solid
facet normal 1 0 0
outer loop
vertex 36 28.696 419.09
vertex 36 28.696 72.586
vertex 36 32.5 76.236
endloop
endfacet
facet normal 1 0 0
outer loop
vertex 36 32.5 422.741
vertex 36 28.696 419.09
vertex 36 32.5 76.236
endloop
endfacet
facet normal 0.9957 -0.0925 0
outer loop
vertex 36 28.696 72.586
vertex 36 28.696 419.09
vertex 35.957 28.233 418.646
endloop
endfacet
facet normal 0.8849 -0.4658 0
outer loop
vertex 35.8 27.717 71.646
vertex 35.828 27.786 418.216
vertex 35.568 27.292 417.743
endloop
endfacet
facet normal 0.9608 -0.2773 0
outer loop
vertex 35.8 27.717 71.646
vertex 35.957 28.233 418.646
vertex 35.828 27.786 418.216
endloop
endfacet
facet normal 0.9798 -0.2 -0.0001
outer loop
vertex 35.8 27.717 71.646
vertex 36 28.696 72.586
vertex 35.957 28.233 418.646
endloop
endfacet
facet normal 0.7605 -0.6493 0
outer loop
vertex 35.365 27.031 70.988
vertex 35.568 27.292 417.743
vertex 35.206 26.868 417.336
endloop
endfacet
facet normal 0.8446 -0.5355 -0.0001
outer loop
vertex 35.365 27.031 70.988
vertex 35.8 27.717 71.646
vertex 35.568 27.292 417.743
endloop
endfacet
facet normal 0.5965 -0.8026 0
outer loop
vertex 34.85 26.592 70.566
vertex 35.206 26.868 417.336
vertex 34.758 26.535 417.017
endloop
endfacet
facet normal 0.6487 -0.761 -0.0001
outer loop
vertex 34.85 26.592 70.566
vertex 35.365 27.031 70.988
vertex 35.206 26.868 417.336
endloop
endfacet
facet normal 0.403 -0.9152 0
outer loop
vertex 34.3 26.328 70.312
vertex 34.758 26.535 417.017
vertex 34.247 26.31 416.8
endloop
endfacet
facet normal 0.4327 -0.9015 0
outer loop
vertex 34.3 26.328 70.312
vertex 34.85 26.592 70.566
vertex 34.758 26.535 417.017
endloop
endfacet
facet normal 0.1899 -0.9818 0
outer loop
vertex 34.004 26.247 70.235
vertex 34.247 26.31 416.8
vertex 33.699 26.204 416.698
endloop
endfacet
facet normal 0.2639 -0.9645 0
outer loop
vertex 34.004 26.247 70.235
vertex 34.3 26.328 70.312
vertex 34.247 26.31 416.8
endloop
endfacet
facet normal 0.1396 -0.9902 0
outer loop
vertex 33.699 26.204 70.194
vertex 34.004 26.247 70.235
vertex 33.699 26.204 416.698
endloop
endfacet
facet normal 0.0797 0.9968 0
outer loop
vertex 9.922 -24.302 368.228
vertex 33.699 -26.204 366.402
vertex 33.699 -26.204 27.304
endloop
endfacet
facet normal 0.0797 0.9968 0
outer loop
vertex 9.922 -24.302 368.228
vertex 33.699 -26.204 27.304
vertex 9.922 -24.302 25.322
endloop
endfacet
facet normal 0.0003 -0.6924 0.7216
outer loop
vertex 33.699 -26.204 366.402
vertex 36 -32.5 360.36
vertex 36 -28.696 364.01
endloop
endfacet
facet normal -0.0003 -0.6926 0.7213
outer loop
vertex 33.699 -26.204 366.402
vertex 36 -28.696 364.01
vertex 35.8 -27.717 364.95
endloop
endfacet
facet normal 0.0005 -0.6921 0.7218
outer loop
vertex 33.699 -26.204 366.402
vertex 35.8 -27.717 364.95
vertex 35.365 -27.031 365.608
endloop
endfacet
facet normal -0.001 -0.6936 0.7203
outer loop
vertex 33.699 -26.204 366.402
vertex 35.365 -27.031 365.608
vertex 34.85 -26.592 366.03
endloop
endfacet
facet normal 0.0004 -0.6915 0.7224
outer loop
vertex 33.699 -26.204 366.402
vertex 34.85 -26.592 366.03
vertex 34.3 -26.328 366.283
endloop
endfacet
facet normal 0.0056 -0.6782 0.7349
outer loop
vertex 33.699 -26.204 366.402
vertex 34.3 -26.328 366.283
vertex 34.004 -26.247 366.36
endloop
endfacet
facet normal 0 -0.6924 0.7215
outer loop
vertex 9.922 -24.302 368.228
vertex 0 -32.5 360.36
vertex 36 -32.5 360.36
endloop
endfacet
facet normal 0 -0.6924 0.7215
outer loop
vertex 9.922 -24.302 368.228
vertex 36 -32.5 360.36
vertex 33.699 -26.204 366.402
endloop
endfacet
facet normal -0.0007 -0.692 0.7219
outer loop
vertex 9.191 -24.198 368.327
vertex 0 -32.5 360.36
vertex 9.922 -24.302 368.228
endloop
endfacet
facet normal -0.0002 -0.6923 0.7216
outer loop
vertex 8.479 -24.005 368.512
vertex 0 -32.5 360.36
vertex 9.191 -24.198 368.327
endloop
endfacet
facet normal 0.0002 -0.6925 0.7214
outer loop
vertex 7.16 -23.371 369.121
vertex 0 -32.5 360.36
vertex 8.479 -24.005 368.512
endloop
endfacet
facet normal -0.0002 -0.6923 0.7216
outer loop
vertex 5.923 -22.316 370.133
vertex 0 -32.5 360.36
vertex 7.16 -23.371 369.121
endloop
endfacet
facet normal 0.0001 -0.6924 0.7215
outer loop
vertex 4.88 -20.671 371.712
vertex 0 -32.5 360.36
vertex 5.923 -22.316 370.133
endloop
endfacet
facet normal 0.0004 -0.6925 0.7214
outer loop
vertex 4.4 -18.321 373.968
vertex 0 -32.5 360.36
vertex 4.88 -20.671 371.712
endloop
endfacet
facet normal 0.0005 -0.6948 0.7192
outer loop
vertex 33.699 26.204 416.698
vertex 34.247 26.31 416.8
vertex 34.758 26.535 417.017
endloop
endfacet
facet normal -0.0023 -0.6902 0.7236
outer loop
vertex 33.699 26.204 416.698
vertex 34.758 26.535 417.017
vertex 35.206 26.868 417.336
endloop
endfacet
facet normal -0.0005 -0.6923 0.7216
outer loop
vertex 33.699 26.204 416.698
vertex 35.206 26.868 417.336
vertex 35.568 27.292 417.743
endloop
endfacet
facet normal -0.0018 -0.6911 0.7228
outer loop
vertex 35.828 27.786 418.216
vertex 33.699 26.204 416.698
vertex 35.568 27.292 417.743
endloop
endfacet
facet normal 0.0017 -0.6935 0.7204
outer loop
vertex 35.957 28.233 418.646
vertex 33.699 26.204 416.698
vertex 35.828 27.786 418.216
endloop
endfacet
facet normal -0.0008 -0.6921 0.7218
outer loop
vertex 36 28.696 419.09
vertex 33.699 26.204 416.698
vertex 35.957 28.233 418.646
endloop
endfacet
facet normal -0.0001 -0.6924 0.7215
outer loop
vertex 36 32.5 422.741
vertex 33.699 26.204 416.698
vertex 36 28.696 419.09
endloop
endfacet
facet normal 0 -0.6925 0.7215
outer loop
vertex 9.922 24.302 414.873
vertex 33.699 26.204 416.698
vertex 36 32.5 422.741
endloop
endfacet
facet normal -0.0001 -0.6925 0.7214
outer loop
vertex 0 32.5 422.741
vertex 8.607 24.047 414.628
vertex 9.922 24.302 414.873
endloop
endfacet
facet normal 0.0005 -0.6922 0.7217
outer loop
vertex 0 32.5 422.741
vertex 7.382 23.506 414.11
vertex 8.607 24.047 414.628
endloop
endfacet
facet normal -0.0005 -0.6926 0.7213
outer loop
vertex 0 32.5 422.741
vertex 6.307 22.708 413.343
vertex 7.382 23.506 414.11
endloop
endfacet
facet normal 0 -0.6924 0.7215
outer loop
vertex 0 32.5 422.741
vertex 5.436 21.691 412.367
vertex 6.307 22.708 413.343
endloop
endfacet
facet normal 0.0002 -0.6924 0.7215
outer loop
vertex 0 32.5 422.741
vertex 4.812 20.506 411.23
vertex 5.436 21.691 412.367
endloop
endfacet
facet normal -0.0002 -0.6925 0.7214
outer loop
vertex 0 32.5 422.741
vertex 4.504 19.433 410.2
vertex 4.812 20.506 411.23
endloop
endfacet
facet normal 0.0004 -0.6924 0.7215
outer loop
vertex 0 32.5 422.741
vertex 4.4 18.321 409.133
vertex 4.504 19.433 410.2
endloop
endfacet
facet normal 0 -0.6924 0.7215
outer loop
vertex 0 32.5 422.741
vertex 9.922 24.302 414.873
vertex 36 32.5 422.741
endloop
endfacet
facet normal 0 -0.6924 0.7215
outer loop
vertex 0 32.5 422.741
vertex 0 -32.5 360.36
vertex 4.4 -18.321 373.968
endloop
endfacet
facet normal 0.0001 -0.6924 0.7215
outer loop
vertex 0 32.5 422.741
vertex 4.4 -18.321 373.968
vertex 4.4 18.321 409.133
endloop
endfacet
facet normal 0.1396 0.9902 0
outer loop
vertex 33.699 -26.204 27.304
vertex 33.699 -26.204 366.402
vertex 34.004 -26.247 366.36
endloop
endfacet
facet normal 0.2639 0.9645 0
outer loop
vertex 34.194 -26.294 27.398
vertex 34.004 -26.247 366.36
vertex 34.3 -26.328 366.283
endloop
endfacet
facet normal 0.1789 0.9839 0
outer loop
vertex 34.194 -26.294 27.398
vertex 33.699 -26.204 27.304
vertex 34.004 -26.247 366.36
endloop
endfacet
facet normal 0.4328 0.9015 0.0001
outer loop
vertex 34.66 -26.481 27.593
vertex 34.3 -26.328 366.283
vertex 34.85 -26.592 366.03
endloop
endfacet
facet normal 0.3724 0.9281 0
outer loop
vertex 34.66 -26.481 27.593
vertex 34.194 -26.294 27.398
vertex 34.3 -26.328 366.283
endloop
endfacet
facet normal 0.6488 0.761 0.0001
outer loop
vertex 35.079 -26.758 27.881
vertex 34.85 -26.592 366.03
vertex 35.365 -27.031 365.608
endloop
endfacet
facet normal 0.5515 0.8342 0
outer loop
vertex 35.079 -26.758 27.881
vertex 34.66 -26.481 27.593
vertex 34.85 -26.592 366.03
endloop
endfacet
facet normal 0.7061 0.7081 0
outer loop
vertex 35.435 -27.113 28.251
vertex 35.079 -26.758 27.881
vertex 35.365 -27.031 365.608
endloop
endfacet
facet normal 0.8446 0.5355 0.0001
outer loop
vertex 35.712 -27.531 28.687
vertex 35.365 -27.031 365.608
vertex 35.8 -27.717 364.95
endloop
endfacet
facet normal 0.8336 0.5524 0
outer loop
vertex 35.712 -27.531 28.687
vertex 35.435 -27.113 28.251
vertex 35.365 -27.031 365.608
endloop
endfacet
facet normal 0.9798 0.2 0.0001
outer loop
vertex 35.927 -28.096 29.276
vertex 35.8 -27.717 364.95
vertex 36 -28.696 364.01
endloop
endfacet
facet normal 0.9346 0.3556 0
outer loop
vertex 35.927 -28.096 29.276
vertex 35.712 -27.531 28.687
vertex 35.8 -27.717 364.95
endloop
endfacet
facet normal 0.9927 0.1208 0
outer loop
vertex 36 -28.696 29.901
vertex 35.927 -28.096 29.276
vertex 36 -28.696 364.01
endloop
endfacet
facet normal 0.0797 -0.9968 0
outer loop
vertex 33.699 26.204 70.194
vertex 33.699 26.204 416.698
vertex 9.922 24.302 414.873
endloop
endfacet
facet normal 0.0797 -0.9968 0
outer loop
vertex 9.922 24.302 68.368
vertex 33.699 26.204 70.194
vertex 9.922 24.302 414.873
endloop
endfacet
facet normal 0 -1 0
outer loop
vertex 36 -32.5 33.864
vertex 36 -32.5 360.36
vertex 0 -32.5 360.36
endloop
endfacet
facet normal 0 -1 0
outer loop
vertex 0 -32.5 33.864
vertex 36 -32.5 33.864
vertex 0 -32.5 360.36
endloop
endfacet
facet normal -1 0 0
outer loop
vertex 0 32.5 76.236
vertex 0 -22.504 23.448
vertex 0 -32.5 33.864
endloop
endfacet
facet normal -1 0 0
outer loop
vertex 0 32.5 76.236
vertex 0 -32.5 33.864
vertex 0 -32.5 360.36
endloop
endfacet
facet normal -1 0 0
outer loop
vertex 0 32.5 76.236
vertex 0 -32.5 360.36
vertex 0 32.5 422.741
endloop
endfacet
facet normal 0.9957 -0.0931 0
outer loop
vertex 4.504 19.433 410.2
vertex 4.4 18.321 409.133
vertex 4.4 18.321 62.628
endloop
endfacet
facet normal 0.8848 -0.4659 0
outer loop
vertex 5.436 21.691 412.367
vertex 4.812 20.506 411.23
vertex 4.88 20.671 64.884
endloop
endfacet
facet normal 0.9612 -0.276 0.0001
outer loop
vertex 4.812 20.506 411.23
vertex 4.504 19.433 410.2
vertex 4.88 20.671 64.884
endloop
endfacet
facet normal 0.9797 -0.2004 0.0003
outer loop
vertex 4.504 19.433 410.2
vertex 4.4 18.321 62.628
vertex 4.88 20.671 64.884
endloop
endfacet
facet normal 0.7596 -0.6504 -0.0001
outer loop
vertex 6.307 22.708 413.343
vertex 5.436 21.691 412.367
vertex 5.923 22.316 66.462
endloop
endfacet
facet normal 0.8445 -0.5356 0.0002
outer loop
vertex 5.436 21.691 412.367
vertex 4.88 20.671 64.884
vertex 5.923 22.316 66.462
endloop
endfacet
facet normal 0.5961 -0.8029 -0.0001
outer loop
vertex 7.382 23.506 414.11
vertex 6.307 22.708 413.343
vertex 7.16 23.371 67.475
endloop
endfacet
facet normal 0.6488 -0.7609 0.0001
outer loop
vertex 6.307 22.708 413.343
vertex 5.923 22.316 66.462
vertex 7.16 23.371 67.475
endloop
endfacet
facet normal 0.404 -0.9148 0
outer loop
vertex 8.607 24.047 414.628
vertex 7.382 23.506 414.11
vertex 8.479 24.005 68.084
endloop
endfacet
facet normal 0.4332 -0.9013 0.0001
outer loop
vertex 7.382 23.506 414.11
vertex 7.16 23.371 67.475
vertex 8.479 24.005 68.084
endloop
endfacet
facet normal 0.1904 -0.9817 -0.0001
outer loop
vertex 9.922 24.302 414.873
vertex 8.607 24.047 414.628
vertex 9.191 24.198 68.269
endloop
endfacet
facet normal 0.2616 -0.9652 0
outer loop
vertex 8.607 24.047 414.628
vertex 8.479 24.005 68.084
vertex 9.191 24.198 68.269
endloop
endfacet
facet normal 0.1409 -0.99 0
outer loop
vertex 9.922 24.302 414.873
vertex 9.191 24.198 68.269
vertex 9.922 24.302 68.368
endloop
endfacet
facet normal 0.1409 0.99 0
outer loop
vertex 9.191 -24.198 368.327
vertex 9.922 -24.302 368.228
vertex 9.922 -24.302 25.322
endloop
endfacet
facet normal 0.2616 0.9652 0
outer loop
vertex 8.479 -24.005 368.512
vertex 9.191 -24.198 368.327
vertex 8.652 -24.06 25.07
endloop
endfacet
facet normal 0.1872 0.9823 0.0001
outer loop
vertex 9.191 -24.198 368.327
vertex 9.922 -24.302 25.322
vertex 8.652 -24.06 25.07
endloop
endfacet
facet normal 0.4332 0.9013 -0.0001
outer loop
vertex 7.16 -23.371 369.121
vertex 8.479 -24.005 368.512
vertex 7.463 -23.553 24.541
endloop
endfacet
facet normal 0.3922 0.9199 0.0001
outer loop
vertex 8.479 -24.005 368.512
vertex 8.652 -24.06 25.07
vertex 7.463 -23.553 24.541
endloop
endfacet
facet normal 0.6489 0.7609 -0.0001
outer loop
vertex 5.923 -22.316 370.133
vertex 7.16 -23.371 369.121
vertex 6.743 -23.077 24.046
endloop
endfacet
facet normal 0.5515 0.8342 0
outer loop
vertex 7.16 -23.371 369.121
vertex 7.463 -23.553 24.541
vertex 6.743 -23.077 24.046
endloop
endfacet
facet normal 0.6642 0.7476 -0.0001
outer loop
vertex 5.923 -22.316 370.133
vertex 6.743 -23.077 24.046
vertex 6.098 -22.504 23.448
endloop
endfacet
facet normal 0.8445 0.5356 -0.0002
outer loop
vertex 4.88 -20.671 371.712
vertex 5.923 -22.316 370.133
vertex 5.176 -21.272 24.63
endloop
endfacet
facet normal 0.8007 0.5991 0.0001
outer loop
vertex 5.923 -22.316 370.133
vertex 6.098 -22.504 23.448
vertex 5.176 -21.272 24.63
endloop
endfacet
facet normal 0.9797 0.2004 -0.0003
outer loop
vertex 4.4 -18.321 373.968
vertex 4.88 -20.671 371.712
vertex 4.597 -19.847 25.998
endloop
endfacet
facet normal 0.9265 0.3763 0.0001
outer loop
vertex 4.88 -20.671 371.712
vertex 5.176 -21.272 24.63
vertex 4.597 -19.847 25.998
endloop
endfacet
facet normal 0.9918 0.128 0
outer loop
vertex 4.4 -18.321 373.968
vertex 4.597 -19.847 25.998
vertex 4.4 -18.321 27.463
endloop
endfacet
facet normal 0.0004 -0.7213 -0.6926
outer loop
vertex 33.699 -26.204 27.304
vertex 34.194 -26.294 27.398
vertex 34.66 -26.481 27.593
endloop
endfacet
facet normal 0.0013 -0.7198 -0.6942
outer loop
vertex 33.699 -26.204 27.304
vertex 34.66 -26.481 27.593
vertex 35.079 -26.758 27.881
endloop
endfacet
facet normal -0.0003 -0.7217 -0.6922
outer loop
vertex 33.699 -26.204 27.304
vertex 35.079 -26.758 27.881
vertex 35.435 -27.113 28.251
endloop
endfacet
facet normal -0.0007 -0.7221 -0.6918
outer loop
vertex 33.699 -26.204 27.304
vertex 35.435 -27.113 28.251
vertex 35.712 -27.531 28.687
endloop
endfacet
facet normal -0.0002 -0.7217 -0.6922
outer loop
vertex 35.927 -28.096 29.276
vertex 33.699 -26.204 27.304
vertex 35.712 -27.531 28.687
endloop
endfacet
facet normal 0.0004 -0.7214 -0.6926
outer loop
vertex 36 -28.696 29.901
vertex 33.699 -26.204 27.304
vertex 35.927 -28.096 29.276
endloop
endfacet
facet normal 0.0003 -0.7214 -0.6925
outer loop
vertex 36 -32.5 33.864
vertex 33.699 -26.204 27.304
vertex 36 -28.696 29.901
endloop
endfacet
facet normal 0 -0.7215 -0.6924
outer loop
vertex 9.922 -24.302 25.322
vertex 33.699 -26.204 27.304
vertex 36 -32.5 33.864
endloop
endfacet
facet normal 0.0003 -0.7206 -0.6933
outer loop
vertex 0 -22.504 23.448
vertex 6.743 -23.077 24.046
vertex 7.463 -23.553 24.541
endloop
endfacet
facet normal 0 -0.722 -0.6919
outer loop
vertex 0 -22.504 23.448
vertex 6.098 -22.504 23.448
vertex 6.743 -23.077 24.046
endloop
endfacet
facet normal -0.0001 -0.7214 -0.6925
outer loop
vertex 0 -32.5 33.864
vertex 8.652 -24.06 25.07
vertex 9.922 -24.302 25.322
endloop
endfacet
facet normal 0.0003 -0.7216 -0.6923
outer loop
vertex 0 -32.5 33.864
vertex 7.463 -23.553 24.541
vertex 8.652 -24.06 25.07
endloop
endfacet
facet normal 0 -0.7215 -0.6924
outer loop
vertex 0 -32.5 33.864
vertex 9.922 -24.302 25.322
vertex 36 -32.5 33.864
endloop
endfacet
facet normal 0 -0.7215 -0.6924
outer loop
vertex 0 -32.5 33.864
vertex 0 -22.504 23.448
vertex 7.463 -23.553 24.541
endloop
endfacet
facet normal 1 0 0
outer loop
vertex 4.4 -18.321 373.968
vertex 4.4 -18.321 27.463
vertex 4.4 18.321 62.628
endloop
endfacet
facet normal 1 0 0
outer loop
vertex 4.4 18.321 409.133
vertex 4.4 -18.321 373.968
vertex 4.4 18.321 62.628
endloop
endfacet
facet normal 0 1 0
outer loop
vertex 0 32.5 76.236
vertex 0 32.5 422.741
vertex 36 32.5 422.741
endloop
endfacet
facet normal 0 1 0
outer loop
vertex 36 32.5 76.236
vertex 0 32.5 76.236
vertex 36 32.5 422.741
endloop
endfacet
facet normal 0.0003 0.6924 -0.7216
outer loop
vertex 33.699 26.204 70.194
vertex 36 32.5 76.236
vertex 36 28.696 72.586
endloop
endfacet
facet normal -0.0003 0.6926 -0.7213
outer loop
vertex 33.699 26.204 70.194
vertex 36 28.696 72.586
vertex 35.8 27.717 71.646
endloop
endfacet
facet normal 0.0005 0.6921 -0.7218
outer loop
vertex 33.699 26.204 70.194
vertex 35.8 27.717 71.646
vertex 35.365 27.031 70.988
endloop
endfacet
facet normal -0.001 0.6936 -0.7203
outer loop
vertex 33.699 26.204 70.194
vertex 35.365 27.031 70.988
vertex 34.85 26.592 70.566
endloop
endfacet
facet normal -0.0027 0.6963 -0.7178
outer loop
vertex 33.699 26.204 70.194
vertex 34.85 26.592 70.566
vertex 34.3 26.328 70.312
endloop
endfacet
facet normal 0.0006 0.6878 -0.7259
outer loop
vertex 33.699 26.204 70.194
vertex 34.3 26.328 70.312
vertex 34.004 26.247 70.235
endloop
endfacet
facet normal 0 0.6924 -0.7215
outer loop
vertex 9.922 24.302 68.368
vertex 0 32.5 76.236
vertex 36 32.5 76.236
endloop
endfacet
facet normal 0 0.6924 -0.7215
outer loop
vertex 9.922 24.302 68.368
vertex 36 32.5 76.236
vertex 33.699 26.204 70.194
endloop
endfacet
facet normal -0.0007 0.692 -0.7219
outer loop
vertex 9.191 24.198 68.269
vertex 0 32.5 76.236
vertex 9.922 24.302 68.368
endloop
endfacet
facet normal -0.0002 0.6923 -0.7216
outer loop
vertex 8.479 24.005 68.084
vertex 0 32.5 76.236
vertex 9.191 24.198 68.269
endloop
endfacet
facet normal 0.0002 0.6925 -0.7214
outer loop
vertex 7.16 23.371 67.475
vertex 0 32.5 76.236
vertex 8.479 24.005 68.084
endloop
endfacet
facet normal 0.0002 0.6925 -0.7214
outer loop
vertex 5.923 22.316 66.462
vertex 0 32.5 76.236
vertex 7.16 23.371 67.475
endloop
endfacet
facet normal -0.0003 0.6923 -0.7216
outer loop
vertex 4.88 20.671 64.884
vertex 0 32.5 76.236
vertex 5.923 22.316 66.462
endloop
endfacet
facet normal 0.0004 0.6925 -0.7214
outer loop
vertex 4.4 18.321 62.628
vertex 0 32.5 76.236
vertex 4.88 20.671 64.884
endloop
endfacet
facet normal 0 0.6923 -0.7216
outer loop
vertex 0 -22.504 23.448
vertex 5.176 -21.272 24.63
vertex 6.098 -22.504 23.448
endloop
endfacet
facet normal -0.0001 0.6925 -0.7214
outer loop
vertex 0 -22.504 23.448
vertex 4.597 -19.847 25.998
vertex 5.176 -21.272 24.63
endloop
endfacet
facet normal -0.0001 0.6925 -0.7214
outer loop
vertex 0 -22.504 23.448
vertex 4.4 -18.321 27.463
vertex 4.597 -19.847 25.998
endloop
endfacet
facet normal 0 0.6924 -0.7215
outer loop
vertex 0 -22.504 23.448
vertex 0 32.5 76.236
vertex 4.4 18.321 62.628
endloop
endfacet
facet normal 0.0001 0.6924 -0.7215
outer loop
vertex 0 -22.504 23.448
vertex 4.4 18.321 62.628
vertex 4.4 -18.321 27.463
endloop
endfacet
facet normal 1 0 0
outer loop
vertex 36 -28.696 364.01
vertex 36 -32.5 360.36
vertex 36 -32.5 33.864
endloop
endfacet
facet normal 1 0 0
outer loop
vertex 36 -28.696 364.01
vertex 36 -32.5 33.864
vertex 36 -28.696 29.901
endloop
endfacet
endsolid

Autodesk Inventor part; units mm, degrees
ref_plane "Начальная плоскость" through (0, 0, 23.4485) normal (0, 0, 1) x (1, 0, 0)
ref_plane "Конечная плоскость" through (0, 0, 422.7409) normal (0, 0, 1) x (1, 0, 0)
sketch "Эскиз" plane through (0, 0, 0) normal (0, 0, 1) x (1, 0, 0)
  line L0 (36, -32.5) -> (0, -32.5)
  line L1 (36, -32.5) -> (36, -28.696)
  line L2 (33.6994, -26.2039) -> (9.9215, -24.3017)
  line L3 (4.4, -18.3208) -> (4.4, 18.3208)
  line L4 (33.6994, 26.2039) -> (9.9215, 24.3017)
  line L5 (36, 28.696) -> (36, 32.5)
  line L6 (0, 32.5) -> (36, 32.5)
  line L7 (0, -32.5) -> (0, 32.5)
  arc A0 (4.4, -18.3208) -> (9.9215, -24.3017) centre (10.4, -18.3208) ccw
  arc A1 (9.9215, 24.3017) -> (4.4, 18.3208) centre (10.4, 18.3208) ccw
  arc A2 (36, -28.696) -> (33.6994, -26.2039) centre (33.5, -28.696) ccw
  arc A3 (33.6994, 26.2039) -> (36, 28.696) centre (33.5, 28.696) ccw
  line L8 (0, 45.5) -> (0, -45.5) construction
  line L9 (-7.2974, 0) -> (43.7847, 0) construction
  point P0 (36, -26.388)
  point P1 (4.4, -23.86)
  point P2 (4.4, 23.86)
  point P3 (36, 26.388)
  dimension "d3" = 36
  dimension "d5" = 4.4
  dimension "d7" = 65
  dimension "d9" = 8.64
  dimension "d11" = 8.64
  dimension "d13" = 6.112
  dimension "d15" = 6.112
  dimension "d22" = 6
  dimension "d23" = 2.5
  dimension "d24" = 32.5
  dimension "d25" = 0
extrude "Тело" add sketch "Эскиз" along normal up to surface (399.2924 mm away) from surface at 23.4485
sketch "Sketch3" plane through (0, 0, 0) normal (0, 0, 1) x (1, 0, 0)
  line L0 (0, 0) -> (10, 0)
ref_plane "Work Plane7" through (0, 0, 0) normal (0, -1, 0) x (1, 0, 0)
sketch "Sketch4" plane through (0, 0, 0) normal (0, -1, 0) x (1, 0, 0)
  line L0 (-2, 23.4485) -> (12, 23.4485)
  line L1 (-2, 422.7409) -> (12, 422.7409)
  dimension "d29" = 399.2924
ref_plane "РабПлоскость8" through (36, 285.6248, 665.6679) normal (0, -0.6924238, 0.721491) x (1, 0, 0)
split "Разделение1" plane through (36, 285.6248, 665.6679) removes the side toward (0, -0.6924238, 0.721491)
ref_plane "РабПлоскость9" through (0, 458.7307, 485.2951) normal (0, 0.6924238, -0.721491) x (1, 0, 0)
split "Разделение2" plane through (0, 458.7307, 485.2951) removes the side toward (0, 0.6924238, -0.721491)
ref_plane "РабПлоскость10" through (36, 195.6464, -203.8595) normal (0, -0.721491, -0.6924238) x (1, 0, 0)
split "Разделение3" plane through (36, 195.6464, -203.8595) removes the side toward (0, -0.721491, -0.6924238)
equation "\"d3\" = b"
equation "\"d5\" = t1"
equation "\"d7\" = ParH"
equation "\"d9\" = msp_x1 + t2"
equation "\"d11\" = msp_x1 + t2"
equation "\"d13\" = -msp_x2 + t2"
equation "\"d15\" = -msp_x2 + t2"
equation "\"d22\" = R"
equation "\"d23\" = R1"
equation "\"d24\" = 0.5 * d7"
equation "\"d16\" = G_L"
equation "\"R1\" = 2.5"
equation "\"R\" = 6"
equation "\"t1\" = 4.4"
equation "\"t2\" = 7.2"
equation "\"ParH\" = 65"
equation "\"b\" = 36"
equation "\"msp_x1\" = 0.04 * b"
equation "\"msp_x2\" = -0.08 * t1 + 0.04 * b"
equation "\"G_L\" = d29"
equation "\"ex\" = 0"
equation "\"G_OFFSET_START\" = -23.44846"
equation "\"G_OFFSET_END\" = -58.90056"
equation "\"d26\" = -G_OFFSET_START"
equation "\"d27\" = G_OFFSET_END + B_L"
equation "\"B_L\" = 481.64146"
properties part number "Швеллер 6.5U-399,29 ГОСТ 8240-97" material "Сталь, мягкая"
